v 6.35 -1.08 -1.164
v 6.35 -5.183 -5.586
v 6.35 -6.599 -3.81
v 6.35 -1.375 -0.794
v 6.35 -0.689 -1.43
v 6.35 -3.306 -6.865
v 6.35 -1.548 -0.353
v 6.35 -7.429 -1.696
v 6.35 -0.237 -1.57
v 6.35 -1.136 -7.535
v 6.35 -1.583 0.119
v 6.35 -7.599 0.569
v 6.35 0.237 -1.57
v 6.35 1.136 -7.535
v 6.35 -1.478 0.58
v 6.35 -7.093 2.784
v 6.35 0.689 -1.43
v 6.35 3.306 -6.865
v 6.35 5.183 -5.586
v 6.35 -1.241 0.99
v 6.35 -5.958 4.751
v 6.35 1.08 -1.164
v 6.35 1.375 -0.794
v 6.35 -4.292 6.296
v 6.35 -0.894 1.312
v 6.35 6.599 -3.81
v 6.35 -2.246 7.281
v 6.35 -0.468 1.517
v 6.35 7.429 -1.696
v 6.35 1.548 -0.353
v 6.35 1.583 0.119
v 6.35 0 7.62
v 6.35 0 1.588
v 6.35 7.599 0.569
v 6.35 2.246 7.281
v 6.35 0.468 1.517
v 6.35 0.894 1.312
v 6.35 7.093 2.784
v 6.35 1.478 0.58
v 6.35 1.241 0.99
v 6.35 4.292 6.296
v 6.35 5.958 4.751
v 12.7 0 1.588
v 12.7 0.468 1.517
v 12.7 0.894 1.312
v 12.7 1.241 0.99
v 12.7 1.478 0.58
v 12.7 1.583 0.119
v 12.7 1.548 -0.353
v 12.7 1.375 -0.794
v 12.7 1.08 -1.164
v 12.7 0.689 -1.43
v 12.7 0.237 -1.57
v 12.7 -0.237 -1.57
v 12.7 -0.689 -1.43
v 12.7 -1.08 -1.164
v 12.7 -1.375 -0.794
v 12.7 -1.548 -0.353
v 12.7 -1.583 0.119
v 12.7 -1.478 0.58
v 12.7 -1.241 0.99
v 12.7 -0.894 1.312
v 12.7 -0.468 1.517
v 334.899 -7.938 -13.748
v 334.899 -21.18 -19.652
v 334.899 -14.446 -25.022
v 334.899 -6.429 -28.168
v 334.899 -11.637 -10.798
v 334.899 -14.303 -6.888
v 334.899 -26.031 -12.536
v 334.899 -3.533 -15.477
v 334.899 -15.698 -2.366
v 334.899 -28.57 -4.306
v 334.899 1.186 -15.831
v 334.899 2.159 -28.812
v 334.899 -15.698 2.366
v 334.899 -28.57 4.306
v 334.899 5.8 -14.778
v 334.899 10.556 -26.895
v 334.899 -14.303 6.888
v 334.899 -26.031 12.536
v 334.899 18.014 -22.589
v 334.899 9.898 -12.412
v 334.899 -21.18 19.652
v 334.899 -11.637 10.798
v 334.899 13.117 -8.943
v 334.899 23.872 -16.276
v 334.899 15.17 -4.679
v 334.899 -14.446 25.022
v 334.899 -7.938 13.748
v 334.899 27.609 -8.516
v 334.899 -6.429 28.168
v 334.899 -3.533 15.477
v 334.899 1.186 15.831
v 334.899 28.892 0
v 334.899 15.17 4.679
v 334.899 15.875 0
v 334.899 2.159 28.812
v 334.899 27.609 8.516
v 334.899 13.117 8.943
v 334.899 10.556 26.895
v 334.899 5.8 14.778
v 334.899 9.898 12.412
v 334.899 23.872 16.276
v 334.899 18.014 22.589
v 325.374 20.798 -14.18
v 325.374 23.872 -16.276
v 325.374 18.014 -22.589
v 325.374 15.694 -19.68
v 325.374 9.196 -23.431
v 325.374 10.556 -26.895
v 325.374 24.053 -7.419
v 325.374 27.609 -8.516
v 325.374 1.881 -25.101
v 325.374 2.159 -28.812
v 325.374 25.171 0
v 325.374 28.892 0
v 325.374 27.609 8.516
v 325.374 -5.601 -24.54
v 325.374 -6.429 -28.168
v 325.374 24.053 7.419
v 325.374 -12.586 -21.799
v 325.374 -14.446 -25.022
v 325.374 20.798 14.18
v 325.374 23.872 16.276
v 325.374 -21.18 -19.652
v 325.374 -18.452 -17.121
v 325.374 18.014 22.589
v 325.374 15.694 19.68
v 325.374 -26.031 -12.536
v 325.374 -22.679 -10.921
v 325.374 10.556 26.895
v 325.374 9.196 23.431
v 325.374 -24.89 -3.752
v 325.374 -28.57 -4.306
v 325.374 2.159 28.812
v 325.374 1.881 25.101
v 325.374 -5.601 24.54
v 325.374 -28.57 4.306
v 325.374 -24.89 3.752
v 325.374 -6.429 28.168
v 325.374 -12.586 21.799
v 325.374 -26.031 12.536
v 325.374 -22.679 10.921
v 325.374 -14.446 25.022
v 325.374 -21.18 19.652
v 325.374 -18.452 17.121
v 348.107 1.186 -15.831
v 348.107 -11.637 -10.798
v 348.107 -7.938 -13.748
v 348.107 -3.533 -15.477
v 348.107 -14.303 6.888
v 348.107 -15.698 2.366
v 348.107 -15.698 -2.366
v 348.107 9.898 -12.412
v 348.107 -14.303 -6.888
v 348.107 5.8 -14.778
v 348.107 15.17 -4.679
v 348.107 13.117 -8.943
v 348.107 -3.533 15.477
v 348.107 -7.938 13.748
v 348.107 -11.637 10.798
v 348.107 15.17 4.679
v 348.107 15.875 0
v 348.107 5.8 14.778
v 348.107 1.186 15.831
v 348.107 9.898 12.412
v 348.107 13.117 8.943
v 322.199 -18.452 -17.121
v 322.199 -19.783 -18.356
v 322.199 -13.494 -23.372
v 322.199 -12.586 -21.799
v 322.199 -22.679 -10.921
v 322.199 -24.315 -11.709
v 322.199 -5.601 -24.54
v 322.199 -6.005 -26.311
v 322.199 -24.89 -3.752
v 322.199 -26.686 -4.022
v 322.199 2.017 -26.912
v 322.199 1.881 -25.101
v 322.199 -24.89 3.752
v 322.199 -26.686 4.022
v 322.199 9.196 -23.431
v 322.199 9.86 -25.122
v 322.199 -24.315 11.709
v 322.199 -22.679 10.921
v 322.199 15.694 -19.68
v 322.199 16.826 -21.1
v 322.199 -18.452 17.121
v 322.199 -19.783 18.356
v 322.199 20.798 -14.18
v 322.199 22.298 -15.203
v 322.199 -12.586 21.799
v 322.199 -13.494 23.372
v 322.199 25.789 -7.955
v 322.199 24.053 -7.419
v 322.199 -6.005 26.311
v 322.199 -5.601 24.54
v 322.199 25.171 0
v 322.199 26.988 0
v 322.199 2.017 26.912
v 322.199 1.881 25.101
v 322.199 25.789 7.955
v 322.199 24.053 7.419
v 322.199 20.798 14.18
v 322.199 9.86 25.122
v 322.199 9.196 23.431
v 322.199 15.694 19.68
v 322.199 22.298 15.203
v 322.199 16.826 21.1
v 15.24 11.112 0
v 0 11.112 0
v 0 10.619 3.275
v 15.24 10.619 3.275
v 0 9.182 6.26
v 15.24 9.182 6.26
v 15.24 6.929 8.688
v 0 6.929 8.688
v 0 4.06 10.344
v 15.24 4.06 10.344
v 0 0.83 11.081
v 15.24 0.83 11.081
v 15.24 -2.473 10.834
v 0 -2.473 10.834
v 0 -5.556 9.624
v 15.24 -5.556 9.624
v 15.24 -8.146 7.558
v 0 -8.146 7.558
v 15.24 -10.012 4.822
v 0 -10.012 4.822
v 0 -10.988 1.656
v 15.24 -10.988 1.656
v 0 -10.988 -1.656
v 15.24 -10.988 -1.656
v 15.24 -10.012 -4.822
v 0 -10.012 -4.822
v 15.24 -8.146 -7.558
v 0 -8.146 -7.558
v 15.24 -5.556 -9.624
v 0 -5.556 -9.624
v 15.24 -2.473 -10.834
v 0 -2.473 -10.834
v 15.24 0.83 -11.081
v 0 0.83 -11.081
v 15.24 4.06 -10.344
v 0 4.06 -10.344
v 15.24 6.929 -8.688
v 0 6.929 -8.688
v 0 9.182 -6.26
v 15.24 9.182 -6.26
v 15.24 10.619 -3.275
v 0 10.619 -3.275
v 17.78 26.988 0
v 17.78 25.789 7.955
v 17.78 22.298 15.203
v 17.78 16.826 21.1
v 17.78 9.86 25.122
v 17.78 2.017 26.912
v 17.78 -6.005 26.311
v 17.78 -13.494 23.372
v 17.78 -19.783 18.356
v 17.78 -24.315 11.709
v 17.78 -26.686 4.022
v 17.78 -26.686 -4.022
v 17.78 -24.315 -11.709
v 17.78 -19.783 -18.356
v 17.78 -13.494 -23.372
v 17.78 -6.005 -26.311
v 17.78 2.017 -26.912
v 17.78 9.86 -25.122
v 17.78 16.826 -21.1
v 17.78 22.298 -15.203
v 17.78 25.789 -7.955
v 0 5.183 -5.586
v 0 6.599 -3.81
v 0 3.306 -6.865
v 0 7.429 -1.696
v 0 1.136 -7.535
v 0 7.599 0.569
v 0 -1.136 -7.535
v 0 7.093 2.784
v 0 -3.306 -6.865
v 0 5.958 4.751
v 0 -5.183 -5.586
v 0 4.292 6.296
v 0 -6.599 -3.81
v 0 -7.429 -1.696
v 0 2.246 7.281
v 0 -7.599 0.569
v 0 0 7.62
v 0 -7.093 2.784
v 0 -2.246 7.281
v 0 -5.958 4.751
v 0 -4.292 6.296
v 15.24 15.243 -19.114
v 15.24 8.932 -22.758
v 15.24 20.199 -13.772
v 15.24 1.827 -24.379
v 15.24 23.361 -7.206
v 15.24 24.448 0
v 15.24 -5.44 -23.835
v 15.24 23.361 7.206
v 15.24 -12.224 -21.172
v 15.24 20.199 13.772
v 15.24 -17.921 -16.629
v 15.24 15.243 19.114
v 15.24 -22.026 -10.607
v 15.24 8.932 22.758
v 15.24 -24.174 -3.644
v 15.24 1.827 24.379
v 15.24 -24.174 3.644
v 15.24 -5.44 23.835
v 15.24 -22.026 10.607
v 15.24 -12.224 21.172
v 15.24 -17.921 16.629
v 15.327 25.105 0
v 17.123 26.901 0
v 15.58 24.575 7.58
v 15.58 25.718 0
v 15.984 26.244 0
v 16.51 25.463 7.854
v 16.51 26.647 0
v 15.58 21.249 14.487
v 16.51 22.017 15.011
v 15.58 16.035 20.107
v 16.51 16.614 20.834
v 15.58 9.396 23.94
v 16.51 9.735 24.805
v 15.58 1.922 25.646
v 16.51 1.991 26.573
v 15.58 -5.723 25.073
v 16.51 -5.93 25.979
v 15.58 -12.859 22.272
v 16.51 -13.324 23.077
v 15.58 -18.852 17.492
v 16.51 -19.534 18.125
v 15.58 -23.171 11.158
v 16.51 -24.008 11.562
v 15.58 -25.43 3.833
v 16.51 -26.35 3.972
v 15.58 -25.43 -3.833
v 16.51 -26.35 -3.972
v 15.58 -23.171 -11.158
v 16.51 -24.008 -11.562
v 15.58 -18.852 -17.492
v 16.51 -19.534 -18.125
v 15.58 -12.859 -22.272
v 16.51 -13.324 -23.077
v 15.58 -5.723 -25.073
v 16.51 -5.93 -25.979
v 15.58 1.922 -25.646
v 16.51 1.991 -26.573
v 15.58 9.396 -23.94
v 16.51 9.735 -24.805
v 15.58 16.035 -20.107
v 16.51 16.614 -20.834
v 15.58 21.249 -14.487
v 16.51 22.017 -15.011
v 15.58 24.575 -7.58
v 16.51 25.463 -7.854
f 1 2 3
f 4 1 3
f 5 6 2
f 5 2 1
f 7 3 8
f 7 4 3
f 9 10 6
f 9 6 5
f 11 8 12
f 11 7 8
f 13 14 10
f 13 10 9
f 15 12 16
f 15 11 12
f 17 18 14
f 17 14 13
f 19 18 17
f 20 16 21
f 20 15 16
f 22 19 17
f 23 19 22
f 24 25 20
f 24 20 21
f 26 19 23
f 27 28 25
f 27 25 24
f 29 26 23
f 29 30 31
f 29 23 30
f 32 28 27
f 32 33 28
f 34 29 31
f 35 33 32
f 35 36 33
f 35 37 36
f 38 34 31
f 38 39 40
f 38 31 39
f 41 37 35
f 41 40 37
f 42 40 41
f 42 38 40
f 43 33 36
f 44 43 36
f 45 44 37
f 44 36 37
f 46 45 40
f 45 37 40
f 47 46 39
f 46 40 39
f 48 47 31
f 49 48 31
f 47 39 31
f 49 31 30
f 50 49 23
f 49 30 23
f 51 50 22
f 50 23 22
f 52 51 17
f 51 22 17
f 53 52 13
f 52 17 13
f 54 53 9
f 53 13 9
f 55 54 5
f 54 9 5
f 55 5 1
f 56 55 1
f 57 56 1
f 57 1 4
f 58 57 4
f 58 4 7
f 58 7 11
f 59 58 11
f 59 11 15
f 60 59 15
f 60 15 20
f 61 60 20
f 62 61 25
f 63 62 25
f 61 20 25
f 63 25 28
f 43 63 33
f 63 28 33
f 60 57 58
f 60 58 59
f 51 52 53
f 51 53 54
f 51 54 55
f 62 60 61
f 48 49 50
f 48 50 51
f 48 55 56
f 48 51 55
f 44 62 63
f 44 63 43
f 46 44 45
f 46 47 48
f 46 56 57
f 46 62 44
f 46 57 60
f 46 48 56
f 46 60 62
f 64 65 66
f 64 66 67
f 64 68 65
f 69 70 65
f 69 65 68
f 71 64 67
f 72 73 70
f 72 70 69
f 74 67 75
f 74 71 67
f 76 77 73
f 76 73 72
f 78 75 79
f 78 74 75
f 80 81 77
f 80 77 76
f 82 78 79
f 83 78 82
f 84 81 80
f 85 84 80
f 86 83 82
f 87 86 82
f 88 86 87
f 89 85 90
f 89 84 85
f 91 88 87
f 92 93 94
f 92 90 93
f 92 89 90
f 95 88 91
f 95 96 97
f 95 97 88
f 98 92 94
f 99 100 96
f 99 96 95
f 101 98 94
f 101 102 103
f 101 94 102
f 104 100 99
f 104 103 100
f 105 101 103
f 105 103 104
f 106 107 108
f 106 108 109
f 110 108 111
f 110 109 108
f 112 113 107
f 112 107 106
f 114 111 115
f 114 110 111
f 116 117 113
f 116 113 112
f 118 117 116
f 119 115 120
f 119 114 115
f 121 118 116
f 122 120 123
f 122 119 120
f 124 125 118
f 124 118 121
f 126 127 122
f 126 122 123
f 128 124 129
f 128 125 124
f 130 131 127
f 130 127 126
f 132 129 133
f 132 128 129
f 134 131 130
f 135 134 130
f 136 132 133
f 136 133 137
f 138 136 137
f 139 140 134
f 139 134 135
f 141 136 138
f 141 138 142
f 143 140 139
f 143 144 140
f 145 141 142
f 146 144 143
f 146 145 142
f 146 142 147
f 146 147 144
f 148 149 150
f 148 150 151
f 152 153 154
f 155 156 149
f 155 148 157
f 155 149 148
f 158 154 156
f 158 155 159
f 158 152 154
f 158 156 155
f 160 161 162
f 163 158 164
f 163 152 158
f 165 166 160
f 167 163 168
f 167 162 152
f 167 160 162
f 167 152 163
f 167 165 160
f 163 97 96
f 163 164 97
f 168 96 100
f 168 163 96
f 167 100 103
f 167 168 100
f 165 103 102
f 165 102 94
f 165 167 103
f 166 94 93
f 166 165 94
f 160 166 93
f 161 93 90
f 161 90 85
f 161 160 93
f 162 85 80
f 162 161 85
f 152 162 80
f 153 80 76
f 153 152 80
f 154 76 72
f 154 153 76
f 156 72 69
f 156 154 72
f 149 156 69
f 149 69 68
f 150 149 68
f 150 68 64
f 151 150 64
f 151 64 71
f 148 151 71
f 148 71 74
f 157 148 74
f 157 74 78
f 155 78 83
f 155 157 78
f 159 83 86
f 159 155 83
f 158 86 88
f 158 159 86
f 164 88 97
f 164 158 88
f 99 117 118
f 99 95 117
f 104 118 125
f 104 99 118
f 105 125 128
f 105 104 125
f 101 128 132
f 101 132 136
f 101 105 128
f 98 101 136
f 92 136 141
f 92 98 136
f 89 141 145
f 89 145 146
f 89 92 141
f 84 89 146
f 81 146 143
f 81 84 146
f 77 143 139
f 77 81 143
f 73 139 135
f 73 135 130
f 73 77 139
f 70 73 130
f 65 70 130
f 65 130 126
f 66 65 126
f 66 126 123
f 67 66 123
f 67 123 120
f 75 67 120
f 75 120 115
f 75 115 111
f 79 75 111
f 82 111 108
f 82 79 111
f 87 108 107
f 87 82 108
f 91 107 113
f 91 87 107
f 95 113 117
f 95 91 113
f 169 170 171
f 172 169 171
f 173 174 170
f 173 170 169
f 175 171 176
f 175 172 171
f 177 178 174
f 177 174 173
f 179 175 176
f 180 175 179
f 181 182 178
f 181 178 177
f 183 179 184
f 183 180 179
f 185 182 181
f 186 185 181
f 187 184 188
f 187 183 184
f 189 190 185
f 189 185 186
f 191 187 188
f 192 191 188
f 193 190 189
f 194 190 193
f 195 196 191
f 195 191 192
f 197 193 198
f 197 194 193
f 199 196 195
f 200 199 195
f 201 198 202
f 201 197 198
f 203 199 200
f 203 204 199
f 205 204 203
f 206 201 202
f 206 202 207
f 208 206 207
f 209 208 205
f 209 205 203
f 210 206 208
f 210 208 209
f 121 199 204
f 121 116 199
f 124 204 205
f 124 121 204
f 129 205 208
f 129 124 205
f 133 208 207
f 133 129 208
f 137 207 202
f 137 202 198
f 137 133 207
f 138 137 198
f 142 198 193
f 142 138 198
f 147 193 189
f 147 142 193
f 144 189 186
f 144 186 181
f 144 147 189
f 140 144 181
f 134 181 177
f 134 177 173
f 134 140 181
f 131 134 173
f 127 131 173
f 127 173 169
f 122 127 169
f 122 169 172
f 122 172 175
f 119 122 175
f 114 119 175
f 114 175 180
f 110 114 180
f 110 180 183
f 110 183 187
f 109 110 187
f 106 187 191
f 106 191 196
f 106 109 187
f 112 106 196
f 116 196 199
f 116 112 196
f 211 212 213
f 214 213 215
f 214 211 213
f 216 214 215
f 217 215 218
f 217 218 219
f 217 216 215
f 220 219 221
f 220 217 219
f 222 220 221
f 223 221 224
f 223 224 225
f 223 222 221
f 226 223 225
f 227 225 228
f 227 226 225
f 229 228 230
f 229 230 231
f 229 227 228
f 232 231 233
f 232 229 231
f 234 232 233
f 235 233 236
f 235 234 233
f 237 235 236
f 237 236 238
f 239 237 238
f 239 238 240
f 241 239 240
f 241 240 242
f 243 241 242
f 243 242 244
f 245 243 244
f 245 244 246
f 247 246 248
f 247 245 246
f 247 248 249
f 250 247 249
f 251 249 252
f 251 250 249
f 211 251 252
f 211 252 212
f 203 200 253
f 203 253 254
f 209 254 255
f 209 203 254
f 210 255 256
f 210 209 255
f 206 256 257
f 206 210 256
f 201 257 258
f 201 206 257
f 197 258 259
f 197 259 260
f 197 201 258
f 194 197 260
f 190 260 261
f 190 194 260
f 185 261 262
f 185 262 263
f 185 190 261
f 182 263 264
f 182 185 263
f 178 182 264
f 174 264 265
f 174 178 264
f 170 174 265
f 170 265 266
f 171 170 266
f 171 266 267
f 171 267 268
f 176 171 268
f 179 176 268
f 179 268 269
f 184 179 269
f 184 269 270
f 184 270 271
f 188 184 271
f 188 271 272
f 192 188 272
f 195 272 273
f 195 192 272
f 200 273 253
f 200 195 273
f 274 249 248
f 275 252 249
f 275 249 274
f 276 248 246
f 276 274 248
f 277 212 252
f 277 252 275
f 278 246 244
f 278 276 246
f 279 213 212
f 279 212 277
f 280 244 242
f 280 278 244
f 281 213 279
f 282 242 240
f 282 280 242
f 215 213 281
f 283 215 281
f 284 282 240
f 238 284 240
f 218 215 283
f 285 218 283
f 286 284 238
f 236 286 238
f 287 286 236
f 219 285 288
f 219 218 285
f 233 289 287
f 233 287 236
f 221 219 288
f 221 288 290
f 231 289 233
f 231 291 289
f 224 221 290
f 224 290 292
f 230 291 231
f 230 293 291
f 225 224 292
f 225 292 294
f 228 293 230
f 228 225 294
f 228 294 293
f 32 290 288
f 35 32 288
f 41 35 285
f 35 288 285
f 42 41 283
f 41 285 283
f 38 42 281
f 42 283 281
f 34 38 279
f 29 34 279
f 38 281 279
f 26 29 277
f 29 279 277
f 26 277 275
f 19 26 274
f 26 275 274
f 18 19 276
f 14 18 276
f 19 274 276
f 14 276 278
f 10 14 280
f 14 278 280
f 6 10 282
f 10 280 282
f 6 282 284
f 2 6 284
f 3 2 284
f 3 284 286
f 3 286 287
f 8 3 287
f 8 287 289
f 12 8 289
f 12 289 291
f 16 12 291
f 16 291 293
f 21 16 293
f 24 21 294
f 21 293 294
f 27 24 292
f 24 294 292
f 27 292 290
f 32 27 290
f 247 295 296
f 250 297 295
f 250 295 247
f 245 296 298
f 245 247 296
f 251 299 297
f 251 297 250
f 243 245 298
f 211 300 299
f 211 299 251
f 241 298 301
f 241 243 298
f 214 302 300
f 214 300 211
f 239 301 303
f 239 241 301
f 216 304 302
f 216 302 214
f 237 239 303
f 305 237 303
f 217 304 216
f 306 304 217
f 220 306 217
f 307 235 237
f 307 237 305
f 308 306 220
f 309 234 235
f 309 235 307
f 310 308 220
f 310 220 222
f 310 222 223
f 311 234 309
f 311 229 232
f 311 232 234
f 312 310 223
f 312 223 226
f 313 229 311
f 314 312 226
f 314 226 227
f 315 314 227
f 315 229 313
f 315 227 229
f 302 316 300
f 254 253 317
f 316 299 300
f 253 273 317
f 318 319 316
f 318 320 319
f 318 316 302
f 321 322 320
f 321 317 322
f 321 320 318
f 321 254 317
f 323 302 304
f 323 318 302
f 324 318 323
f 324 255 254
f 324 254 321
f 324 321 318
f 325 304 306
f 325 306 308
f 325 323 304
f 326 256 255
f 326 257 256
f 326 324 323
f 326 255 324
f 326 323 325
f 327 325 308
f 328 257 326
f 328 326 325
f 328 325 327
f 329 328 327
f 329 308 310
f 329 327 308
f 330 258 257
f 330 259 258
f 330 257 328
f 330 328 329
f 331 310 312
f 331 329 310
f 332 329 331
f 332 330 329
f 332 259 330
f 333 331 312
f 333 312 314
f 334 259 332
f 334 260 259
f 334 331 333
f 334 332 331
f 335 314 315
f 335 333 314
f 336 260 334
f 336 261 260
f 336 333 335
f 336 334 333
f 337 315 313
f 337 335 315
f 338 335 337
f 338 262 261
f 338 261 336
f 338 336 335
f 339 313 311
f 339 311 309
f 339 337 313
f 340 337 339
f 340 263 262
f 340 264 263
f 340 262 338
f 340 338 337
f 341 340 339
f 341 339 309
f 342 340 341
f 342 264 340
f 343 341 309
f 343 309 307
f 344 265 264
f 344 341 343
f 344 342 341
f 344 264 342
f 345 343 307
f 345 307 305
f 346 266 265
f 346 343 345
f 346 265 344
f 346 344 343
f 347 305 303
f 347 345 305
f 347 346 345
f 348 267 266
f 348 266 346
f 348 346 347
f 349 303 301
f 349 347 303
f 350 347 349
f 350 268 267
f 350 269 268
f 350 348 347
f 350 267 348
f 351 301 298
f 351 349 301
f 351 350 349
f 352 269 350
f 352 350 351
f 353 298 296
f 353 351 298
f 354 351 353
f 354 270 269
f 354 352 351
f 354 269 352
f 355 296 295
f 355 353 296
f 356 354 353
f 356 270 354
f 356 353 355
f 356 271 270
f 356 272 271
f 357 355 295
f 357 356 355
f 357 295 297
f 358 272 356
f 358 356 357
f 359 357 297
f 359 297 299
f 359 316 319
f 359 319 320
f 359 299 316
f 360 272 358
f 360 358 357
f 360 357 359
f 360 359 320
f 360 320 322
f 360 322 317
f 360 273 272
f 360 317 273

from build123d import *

# Parameters (mm, degrees)
FILLET1_R          = 2.54
SKETCH2_R          = 7.62
CUT_EXTRUDE1_DEPTH = 6.35
SKETCH3_R          = 1.5875
CUT_EXTRUDE2_DEPTH = 6.35


with BuildPart() as part:
    # Sketch1 → Revolve1 (revolve)
    with BuildSketch(Plane.XY):
        Polygon((0, 0), (0, 11.1125), (15.24, 11.1125), (15.24, 26.9875), (322.199, 26.9875), (322.199, 25.1714), (325.374, 25.1714), (325.374, 28.8925), (334.899, 28.8925), (334.899, 15.875), (348.107, 15.875), (348.107, 0), align=None)
    revolve(axis=Axis((0, 0, 0), (1, 0, 0)))

    # Fillet1
    fillet1_edges = [part.edges().sort_by_distance(p)[0] for p in [
        (15.24, -26.9875, 0),
    ]]
    fillet(fillet1_edges, radius=FILLET1_R)

    # Sketch2 → Cut-Extrude1 (cut)
    with BuildSketch(Plane.ZY):
        Circle(SKETCH2_R)
    extrude(amount=-CUT_EXTRUDE1_DEPTH, mode=Mode.SUBTRACT)

    # Sketch3 → Cut-Extrude2 (cut)
    with BuildSketch(Plane.ZY.offset(-6.35)):
        Circle(SKETCH3_R)
    extrude(amount=-CUT_EXTRUDE2_DEPTH, mode=Mode.SUBTRACT)


solid = part.part
